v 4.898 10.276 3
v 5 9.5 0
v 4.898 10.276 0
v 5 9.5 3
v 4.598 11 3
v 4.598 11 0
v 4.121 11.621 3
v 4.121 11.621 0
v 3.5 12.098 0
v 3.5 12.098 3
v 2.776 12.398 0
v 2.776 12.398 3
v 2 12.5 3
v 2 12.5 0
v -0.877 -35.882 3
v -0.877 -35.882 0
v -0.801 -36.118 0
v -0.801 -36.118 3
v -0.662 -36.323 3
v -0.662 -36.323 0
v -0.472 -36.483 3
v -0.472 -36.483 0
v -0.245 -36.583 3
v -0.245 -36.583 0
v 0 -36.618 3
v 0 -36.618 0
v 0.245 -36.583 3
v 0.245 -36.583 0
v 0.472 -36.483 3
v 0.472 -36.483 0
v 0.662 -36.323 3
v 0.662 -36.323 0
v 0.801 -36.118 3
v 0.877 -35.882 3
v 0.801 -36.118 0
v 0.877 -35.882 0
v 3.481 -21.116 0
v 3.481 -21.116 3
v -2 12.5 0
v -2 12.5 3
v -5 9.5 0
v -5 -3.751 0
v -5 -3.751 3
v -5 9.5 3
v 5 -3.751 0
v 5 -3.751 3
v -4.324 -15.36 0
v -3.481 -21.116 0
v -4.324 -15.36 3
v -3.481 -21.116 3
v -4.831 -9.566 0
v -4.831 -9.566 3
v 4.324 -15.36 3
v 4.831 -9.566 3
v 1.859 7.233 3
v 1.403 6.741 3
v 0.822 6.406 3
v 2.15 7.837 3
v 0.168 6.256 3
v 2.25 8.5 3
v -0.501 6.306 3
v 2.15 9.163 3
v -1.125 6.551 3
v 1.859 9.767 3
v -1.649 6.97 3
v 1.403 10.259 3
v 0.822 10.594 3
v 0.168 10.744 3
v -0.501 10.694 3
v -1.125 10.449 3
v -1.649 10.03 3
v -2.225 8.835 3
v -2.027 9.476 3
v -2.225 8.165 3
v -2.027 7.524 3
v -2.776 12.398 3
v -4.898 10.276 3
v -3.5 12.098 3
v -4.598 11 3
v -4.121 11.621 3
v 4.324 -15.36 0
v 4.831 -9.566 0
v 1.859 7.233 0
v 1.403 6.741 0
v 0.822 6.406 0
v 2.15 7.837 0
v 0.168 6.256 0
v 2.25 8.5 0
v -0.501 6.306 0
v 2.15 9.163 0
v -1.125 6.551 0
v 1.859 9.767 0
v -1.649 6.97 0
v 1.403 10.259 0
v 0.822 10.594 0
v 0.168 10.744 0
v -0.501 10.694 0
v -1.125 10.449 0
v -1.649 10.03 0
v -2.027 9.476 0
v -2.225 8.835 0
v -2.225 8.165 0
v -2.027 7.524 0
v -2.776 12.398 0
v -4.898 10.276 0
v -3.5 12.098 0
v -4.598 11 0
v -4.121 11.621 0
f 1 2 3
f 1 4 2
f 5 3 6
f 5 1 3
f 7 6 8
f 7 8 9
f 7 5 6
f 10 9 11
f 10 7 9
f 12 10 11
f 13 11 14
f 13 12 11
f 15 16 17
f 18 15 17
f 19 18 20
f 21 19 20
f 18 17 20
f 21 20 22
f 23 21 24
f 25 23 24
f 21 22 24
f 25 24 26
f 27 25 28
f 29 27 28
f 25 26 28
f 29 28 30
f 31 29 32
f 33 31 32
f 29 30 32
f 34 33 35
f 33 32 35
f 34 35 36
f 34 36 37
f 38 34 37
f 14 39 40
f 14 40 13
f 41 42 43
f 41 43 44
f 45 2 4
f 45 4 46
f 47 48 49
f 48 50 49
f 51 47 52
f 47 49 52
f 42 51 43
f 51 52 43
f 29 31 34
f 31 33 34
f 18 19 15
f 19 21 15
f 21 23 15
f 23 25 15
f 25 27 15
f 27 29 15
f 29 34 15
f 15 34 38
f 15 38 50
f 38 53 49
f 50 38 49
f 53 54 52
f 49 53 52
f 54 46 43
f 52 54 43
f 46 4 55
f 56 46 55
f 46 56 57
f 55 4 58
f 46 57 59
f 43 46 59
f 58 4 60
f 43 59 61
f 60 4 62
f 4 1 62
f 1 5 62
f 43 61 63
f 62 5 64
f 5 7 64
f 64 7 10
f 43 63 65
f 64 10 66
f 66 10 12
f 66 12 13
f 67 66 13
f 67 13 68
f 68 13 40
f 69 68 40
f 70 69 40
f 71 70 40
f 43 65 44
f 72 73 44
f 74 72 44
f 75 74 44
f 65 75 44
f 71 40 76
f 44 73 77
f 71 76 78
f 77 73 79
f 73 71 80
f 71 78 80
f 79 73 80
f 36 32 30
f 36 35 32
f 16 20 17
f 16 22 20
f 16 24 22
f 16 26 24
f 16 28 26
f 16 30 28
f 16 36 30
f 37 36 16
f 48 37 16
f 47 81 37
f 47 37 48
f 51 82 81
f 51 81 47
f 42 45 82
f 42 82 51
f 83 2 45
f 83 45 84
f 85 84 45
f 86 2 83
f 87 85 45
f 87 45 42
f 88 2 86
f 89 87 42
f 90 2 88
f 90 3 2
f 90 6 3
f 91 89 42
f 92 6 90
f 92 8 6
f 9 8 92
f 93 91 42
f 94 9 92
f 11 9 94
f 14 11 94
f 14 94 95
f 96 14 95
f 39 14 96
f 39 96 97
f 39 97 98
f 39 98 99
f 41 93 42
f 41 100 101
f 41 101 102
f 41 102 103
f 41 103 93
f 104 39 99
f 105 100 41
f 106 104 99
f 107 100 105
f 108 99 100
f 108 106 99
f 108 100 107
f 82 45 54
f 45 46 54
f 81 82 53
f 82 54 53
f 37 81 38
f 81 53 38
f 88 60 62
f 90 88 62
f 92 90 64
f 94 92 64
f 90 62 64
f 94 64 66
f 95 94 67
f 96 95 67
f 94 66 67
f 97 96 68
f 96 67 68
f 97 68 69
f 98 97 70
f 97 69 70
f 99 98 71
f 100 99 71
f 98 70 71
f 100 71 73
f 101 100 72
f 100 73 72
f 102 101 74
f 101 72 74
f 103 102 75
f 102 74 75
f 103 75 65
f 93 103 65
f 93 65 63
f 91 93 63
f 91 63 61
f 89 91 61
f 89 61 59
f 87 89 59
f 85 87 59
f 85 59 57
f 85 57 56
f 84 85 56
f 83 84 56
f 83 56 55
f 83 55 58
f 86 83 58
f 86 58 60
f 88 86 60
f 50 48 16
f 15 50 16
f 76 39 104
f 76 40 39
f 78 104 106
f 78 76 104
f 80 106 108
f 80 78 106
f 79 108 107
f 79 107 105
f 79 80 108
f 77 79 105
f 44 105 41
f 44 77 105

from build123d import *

# Parameters (mm, degrees)
PAD_DEPTH    = 3
FILLET_R     = 100
FILLET001_R  = 3
SKETCH001_R  = 2.25
POCKET_DEPTH = 5


with BuildPart() as part:
    # Sketch → Pad (new body)
    with BuildSketch(Plane.XY):
        with BuildLine():
            Line((-5, 12.5), (5, 12.5))
            Line((5, 12.5), (5, -12.5))
            Line((0.877121, -35.882006), (5, -12.5))
            ThreePointArc((-0.877121, -35.882006), (0, -36.617999), (0.877121, -35.882006))
            Line((-5, -12.5), (-0.877121, -35.882006))
            Line((-5, -12.5), (-5, 12.5))
        make_face()
    extrude(amount=PAD_DEPTH)

    # Fillet
    fillet_edges = [part.edges().sort_by_distance(p)[0] for p in [
        (5, -12.5, 1.5),
        (-5, -12.5, 1.5),
    ]]
    fillet(fillet_edges, radius=FILLET_R)

    # Fillet001
    fillet001_edges = [part.edges().sort_by_distance(p)[0] for p in [
        (5, 12.5, 1.5),
        (-5, 12.5, 1.5),
    ]]
    fillet(fillet001_edges, radius=FILLET001_R)

    # Sketch001 (on Face5 of Fillet001) → Pocket (cut)
    with BuildSketch(Plane.XY.offset(3)):
        with Locations((0, 8.5)):
            Circle(SKETCH001_R)
    extrude(amount=-POCKET_DEPTH, mode=Mode.SUBTRACT)


solid = part.part
